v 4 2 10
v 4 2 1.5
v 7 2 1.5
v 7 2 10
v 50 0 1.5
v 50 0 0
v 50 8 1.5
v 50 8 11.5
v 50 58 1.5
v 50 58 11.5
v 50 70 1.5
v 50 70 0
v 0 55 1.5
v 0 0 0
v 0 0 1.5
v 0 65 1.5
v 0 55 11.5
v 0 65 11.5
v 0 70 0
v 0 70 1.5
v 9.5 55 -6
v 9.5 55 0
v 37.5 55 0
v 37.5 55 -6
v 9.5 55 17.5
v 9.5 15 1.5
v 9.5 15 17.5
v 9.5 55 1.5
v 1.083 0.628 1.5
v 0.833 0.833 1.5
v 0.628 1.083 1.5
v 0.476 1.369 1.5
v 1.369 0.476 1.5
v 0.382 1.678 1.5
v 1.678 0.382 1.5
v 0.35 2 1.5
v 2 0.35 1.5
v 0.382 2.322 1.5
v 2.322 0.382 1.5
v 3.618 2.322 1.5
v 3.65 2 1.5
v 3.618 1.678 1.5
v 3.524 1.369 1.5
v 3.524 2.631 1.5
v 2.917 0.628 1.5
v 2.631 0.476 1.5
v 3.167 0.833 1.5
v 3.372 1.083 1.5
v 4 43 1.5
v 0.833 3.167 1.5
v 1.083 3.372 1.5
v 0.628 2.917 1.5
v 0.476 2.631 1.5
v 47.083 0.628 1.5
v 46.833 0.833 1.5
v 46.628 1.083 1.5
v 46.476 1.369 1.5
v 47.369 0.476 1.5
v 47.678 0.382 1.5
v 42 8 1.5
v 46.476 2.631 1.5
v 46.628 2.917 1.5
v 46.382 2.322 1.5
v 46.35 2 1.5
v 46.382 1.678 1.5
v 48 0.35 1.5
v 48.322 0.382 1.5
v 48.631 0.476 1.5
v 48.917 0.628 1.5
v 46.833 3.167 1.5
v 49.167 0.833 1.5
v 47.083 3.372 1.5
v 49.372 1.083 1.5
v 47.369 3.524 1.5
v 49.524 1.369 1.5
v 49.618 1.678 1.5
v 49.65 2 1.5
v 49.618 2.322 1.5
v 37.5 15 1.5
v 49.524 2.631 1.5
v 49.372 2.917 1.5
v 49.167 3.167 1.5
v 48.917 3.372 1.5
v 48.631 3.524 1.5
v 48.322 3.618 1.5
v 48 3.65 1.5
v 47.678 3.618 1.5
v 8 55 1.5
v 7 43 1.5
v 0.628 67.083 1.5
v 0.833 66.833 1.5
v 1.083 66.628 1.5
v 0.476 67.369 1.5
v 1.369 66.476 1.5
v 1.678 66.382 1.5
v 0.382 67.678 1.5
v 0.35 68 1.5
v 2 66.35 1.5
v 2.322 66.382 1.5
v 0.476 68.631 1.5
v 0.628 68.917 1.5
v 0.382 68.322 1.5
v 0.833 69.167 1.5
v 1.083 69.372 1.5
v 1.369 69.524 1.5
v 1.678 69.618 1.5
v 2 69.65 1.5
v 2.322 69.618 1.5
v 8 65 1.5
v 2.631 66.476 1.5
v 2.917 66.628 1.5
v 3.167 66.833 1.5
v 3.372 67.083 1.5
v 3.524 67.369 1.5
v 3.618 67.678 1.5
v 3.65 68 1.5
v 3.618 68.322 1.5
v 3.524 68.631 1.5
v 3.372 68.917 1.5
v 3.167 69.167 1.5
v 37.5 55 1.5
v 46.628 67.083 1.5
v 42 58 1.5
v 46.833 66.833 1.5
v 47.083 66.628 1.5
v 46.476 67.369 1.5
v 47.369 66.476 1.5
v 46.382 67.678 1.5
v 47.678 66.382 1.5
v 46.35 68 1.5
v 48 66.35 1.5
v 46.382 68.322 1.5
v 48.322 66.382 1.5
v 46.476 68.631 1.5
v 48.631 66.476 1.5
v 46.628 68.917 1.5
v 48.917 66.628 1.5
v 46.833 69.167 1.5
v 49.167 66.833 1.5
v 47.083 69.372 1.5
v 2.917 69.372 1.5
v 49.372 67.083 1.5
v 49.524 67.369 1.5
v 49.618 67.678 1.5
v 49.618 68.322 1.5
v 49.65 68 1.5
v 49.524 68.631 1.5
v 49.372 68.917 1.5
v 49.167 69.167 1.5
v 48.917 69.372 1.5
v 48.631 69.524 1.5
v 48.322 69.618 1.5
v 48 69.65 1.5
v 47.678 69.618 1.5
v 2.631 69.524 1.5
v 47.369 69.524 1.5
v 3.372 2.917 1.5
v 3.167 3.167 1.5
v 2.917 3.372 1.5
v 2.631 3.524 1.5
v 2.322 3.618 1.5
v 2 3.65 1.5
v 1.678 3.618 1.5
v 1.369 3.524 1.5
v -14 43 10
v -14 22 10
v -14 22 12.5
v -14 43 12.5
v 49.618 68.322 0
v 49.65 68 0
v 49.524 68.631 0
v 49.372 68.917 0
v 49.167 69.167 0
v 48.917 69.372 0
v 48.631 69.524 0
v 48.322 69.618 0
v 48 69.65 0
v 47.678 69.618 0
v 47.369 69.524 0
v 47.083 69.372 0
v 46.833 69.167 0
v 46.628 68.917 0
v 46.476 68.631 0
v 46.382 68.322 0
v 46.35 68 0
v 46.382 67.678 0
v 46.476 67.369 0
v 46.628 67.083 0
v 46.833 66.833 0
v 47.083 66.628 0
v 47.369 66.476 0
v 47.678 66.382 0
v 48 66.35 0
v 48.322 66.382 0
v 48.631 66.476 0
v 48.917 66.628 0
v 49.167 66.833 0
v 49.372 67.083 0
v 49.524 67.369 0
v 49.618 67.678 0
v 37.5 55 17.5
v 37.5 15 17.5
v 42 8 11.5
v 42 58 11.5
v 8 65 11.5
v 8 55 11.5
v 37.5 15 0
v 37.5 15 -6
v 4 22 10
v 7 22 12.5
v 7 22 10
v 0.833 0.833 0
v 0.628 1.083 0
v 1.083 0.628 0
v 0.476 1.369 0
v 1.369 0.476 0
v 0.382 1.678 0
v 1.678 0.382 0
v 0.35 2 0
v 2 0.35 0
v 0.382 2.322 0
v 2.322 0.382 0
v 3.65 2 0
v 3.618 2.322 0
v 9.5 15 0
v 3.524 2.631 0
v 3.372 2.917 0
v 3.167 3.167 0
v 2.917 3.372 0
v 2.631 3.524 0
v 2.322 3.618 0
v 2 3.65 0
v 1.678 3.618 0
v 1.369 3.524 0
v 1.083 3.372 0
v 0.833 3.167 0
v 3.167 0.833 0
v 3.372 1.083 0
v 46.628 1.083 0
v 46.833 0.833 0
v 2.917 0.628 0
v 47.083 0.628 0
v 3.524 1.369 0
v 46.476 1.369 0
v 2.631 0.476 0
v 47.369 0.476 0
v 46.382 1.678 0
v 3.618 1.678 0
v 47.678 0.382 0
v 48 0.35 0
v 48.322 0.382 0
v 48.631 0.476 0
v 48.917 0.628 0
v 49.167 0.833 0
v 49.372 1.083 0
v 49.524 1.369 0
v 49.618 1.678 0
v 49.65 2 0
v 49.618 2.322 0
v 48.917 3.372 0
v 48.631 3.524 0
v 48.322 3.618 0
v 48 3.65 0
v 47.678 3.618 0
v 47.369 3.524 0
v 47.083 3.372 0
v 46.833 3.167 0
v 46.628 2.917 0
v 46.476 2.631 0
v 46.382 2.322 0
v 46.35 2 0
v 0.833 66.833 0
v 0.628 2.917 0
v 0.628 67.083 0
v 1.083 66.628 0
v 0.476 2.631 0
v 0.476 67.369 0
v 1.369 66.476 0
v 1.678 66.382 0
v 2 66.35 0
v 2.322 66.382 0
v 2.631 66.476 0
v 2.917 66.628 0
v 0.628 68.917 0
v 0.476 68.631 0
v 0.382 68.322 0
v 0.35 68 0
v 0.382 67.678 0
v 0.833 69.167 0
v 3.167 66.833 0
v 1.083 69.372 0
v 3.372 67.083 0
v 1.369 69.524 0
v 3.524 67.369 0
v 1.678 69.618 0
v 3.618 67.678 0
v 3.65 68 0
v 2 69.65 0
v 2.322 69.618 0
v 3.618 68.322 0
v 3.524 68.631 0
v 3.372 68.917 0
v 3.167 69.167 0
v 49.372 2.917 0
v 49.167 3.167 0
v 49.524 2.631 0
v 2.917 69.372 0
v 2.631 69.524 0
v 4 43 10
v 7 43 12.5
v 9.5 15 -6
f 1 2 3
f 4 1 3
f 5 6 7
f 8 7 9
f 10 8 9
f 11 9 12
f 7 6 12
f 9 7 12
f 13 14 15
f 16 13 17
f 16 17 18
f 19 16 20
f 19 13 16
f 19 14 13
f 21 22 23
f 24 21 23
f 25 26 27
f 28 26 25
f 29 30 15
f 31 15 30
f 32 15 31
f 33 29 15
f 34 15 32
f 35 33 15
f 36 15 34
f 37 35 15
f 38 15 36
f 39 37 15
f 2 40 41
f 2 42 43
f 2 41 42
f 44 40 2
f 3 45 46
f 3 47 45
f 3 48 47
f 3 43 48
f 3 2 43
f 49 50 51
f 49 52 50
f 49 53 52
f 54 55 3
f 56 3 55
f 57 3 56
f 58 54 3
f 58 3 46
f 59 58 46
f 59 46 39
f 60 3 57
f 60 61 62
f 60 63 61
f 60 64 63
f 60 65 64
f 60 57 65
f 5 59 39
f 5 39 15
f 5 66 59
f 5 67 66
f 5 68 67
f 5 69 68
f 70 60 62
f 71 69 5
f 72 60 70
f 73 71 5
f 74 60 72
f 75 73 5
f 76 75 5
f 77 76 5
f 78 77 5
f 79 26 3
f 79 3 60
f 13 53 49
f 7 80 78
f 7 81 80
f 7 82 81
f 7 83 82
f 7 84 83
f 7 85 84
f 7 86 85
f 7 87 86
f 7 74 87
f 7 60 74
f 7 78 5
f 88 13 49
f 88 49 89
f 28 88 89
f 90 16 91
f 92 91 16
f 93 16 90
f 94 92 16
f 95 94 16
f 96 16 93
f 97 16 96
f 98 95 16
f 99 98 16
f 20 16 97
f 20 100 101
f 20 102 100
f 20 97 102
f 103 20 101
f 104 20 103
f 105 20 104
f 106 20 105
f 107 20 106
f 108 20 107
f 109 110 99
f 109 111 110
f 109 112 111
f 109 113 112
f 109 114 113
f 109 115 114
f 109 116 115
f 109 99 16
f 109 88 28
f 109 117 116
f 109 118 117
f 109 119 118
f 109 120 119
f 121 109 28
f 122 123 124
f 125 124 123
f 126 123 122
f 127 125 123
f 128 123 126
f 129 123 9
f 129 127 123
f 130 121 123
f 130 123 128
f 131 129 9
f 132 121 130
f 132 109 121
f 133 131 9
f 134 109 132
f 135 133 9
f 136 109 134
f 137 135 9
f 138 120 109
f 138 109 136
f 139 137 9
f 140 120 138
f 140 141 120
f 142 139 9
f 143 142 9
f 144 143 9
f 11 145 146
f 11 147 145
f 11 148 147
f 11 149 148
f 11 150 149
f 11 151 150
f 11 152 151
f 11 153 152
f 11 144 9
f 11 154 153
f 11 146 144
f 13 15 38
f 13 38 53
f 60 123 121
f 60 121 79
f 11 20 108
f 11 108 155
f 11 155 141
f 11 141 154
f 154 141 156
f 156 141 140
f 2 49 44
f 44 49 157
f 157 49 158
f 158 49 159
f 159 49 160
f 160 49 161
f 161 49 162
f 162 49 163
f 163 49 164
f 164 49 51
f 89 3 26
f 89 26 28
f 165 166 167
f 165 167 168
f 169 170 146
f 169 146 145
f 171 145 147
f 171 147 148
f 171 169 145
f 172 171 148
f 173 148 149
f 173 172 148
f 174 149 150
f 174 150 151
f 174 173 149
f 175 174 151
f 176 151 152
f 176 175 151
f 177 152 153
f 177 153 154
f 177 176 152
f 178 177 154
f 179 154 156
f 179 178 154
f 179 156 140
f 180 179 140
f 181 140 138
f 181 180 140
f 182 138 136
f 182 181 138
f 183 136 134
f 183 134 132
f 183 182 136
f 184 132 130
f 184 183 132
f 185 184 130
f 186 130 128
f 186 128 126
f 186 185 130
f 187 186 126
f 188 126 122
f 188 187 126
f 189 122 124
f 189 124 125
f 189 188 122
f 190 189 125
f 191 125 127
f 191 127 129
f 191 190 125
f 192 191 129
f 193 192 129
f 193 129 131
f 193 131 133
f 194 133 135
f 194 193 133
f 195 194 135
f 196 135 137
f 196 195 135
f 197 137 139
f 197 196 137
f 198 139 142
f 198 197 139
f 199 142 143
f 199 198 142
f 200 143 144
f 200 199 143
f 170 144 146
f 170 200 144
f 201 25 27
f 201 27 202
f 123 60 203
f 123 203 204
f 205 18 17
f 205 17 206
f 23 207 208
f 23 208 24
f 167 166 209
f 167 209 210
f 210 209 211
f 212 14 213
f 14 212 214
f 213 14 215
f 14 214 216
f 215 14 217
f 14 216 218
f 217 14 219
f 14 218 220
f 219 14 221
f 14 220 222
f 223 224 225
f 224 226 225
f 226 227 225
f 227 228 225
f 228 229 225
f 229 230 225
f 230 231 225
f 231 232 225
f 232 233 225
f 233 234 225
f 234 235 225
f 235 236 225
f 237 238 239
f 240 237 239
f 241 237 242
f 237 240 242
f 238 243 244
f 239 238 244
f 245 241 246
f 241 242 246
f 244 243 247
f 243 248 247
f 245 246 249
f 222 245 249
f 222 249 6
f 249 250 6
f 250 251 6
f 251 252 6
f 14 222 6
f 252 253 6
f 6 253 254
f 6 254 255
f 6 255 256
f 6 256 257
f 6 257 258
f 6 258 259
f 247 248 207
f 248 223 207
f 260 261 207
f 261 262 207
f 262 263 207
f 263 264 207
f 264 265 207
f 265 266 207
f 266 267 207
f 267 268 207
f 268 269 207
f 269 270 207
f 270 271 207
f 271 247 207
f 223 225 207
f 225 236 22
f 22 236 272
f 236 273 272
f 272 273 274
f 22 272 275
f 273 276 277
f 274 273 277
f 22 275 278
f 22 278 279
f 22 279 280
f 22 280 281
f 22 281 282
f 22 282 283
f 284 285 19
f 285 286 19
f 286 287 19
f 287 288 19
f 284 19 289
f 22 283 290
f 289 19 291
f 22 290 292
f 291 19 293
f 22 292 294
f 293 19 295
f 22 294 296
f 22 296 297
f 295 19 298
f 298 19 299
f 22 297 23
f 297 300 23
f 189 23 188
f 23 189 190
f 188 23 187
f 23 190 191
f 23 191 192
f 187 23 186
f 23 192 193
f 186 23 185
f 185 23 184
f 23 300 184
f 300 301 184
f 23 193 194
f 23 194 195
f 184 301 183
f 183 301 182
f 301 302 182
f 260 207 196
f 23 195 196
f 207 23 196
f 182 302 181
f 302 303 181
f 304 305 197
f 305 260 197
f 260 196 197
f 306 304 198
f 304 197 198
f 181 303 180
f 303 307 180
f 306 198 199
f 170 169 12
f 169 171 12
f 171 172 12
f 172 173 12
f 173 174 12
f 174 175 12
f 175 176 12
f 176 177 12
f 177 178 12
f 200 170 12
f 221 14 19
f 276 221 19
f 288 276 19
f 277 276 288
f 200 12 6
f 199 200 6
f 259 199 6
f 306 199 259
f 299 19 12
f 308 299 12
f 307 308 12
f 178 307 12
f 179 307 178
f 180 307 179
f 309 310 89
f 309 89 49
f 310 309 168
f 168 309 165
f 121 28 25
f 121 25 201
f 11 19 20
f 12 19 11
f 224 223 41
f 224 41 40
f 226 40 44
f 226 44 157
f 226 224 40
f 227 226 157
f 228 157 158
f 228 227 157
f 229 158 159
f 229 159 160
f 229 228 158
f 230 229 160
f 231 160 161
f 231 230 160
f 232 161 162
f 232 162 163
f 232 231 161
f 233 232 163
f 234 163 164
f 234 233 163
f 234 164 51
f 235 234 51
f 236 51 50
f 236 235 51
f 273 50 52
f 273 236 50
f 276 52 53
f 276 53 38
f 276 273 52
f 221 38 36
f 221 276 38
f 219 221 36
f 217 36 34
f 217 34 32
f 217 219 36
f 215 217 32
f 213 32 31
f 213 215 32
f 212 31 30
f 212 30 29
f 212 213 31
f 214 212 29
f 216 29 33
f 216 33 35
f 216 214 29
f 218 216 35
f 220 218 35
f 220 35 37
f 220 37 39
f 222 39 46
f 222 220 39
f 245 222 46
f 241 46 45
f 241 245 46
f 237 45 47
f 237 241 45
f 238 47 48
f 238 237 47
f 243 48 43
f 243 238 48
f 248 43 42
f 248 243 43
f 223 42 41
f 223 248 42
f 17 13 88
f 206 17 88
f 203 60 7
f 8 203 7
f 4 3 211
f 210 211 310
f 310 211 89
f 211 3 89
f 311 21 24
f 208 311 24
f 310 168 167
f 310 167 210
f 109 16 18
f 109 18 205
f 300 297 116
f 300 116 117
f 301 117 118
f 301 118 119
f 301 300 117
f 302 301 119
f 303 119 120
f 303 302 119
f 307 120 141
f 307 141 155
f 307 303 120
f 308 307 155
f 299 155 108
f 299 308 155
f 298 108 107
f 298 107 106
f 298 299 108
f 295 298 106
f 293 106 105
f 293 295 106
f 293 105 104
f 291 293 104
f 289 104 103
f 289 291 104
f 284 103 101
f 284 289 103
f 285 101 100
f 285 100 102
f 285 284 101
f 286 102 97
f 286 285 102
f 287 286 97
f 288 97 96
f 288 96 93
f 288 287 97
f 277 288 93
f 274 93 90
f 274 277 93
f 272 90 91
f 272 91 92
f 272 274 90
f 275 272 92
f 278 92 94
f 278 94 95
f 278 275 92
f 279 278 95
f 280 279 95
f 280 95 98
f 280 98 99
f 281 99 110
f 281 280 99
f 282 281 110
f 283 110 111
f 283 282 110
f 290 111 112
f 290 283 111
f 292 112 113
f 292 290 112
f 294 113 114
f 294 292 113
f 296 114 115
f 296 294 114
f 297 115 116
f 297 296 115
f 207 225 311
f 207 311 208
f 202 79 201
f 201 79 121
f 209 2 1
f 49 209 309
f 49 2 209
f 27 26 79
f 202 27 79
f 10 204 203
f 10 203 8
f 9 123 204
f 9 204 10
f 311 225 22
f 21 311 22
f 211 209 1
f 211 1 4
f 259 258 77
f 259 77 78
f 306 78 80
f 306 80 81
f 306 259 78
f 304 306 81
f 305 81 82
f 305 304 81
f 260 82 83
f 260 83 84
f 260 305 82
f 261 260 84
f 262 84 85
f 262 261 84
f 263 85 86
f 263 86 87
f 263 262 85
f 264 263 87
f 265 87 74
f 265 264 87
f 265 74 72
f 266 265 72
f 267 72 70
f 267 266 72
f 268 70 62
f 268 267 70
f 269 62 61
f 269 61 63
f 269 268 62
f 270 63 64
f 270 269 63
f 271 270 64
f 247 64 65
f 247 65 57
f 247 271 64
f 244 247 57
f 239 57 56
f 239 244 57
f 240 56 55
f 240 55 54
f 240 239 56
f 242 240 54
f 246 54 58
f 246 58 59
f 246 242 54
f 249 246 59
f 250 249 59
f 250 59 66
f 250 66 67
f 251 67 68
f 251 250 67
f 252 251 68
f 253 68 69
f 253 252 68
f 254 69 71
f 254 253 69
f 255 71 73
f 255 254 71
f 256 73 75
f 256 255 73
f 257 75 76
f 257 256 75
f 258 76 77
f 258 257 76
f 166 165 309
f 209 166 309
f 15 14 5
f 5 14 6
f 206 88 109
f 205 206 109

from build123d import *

# Parameters (mm, degrees)
SKETCH1_W               = 50
SKETCH1_H               = 70
SKETCH1_R               = 1.65
MAIN_PROTOBOARD_DEPTH   = 1.5
SCREW_TERMINALS_START   = 1.5
SKETCH1_3_W             = 8
SKETCH1_3_H             = 50
SKETCH1_3_H_2           = 10
SCREW_TERMINALS_DEPTH   = 10
MCU_START               = 1.5
SKETCH1_5_W             = 28
SKETCH1_5_H             = 40
MCU_DEPTH               = 16
SKETCH1_6_W             = 3
SKETCH1_6_H             = 41
DUPONT_CONNECTORS_DEPTH = 10
CAN_TRANSCEIVER_START   = 10
SKETCH1_7_W             = 14
SKETCH1_7_H             = 21
SKETCH1_7_W_2           = 4
SKETCH1_7_W_3           = 3
CAN_TRANSCEIVER_DEPTH   = 2.5
SKETCH1_8_W             = 28
SKETCH1_8_H             = 40
WIRE_CLEARANCE_DEPTH    = 6


with BuildPart() as part:
    # Sketch1 → Main-Protoboard (new body)
    with BuildSketch(Plane.XY):
        with Locations((25, 35)):
            Rectangle(SKETCH1_W, SKETCH1_H)
        with Locations((2, 2)):
            Circle(SKETCH1_R, mode=Mode.SUBTRACT)
        with Locations((48, 2)):
            Circle(SKETCH1_R, mode=Mode.SUBTRACT)
        with Locations((2, 68)):
            Circle(SKETCH1_R, mode=Mode.SUBTRACT)
        with Locations((48, 68)):
            Circle(SKETCH1_R, mode=Mode.SUBTRACT)
    extrude(amount=MAIN_PROTOBOARD_DEPTH)

    # Sketch1<3> → Screw-Terminals (add)
    with BuildSketch(Plane.XY.offset(SCREW_TERMINALS_START)):
        with Locations((46, 33)):
            Rectangle(SKETCH1_3_W, SKETCH1_3_H)
        with Locations((4, 60)):
            Rectangle(SKETCH1_3_W, SKETCH1_3_H_2)
    extrude(amount=SCREW_TERMINALS_DEPTH)

    # Sketch1<5> → MCU (add)
    with BuildSketch(Plane.XY.offset(MCU_START)):
        with Locations((23.5, 35)):
            Rectangle(SKETCH1_5_W, SKETCH1_5_H)
    extrude(amount=MCU_DEPTH)

    # Sketch1<6> → Dupont-Connectors (add)
    with BuildSketch(Plane.XY):
        with Locations((5.5, 22.5)):
            Rectangle(SKETCH1_6_W, SKETCH1_6_H)
    extrude(amount=DUPONT_CONNECTORS_DEPTH)

    # Sketch1<7> → Can-Transceiver (add)
    with BuildSketch(Plane.XY.offset(CAN_TRANSCEIVER_START)):
        with Locations((-7, 32.5)):
            Rectangle(SKETCH1_7_W, SKETCH1_7_H)
        with Locations((2, 32.5)):
            Rectangle(SKETCH1_7_W_2, SKETCH1_7_H)
        with Locations((5.5, 32.5)):
            Rectangle(SKETCH1_7_W_3, SKETCH1_7_H)
    extrude(amount=CAN_TRANSCEIVER_DEPTH)

    # Sketch1<8> → Wire-Clearance (add)
    with BuildSketch(Plane.XY):
        with Locations((23.5, 35)):
            Rectangle(SKETCH1_8_W, SKETCH1_8_H)
    extrude(amount=-WIRE_CLEARANCE_DEPTH)


solid = part.part
